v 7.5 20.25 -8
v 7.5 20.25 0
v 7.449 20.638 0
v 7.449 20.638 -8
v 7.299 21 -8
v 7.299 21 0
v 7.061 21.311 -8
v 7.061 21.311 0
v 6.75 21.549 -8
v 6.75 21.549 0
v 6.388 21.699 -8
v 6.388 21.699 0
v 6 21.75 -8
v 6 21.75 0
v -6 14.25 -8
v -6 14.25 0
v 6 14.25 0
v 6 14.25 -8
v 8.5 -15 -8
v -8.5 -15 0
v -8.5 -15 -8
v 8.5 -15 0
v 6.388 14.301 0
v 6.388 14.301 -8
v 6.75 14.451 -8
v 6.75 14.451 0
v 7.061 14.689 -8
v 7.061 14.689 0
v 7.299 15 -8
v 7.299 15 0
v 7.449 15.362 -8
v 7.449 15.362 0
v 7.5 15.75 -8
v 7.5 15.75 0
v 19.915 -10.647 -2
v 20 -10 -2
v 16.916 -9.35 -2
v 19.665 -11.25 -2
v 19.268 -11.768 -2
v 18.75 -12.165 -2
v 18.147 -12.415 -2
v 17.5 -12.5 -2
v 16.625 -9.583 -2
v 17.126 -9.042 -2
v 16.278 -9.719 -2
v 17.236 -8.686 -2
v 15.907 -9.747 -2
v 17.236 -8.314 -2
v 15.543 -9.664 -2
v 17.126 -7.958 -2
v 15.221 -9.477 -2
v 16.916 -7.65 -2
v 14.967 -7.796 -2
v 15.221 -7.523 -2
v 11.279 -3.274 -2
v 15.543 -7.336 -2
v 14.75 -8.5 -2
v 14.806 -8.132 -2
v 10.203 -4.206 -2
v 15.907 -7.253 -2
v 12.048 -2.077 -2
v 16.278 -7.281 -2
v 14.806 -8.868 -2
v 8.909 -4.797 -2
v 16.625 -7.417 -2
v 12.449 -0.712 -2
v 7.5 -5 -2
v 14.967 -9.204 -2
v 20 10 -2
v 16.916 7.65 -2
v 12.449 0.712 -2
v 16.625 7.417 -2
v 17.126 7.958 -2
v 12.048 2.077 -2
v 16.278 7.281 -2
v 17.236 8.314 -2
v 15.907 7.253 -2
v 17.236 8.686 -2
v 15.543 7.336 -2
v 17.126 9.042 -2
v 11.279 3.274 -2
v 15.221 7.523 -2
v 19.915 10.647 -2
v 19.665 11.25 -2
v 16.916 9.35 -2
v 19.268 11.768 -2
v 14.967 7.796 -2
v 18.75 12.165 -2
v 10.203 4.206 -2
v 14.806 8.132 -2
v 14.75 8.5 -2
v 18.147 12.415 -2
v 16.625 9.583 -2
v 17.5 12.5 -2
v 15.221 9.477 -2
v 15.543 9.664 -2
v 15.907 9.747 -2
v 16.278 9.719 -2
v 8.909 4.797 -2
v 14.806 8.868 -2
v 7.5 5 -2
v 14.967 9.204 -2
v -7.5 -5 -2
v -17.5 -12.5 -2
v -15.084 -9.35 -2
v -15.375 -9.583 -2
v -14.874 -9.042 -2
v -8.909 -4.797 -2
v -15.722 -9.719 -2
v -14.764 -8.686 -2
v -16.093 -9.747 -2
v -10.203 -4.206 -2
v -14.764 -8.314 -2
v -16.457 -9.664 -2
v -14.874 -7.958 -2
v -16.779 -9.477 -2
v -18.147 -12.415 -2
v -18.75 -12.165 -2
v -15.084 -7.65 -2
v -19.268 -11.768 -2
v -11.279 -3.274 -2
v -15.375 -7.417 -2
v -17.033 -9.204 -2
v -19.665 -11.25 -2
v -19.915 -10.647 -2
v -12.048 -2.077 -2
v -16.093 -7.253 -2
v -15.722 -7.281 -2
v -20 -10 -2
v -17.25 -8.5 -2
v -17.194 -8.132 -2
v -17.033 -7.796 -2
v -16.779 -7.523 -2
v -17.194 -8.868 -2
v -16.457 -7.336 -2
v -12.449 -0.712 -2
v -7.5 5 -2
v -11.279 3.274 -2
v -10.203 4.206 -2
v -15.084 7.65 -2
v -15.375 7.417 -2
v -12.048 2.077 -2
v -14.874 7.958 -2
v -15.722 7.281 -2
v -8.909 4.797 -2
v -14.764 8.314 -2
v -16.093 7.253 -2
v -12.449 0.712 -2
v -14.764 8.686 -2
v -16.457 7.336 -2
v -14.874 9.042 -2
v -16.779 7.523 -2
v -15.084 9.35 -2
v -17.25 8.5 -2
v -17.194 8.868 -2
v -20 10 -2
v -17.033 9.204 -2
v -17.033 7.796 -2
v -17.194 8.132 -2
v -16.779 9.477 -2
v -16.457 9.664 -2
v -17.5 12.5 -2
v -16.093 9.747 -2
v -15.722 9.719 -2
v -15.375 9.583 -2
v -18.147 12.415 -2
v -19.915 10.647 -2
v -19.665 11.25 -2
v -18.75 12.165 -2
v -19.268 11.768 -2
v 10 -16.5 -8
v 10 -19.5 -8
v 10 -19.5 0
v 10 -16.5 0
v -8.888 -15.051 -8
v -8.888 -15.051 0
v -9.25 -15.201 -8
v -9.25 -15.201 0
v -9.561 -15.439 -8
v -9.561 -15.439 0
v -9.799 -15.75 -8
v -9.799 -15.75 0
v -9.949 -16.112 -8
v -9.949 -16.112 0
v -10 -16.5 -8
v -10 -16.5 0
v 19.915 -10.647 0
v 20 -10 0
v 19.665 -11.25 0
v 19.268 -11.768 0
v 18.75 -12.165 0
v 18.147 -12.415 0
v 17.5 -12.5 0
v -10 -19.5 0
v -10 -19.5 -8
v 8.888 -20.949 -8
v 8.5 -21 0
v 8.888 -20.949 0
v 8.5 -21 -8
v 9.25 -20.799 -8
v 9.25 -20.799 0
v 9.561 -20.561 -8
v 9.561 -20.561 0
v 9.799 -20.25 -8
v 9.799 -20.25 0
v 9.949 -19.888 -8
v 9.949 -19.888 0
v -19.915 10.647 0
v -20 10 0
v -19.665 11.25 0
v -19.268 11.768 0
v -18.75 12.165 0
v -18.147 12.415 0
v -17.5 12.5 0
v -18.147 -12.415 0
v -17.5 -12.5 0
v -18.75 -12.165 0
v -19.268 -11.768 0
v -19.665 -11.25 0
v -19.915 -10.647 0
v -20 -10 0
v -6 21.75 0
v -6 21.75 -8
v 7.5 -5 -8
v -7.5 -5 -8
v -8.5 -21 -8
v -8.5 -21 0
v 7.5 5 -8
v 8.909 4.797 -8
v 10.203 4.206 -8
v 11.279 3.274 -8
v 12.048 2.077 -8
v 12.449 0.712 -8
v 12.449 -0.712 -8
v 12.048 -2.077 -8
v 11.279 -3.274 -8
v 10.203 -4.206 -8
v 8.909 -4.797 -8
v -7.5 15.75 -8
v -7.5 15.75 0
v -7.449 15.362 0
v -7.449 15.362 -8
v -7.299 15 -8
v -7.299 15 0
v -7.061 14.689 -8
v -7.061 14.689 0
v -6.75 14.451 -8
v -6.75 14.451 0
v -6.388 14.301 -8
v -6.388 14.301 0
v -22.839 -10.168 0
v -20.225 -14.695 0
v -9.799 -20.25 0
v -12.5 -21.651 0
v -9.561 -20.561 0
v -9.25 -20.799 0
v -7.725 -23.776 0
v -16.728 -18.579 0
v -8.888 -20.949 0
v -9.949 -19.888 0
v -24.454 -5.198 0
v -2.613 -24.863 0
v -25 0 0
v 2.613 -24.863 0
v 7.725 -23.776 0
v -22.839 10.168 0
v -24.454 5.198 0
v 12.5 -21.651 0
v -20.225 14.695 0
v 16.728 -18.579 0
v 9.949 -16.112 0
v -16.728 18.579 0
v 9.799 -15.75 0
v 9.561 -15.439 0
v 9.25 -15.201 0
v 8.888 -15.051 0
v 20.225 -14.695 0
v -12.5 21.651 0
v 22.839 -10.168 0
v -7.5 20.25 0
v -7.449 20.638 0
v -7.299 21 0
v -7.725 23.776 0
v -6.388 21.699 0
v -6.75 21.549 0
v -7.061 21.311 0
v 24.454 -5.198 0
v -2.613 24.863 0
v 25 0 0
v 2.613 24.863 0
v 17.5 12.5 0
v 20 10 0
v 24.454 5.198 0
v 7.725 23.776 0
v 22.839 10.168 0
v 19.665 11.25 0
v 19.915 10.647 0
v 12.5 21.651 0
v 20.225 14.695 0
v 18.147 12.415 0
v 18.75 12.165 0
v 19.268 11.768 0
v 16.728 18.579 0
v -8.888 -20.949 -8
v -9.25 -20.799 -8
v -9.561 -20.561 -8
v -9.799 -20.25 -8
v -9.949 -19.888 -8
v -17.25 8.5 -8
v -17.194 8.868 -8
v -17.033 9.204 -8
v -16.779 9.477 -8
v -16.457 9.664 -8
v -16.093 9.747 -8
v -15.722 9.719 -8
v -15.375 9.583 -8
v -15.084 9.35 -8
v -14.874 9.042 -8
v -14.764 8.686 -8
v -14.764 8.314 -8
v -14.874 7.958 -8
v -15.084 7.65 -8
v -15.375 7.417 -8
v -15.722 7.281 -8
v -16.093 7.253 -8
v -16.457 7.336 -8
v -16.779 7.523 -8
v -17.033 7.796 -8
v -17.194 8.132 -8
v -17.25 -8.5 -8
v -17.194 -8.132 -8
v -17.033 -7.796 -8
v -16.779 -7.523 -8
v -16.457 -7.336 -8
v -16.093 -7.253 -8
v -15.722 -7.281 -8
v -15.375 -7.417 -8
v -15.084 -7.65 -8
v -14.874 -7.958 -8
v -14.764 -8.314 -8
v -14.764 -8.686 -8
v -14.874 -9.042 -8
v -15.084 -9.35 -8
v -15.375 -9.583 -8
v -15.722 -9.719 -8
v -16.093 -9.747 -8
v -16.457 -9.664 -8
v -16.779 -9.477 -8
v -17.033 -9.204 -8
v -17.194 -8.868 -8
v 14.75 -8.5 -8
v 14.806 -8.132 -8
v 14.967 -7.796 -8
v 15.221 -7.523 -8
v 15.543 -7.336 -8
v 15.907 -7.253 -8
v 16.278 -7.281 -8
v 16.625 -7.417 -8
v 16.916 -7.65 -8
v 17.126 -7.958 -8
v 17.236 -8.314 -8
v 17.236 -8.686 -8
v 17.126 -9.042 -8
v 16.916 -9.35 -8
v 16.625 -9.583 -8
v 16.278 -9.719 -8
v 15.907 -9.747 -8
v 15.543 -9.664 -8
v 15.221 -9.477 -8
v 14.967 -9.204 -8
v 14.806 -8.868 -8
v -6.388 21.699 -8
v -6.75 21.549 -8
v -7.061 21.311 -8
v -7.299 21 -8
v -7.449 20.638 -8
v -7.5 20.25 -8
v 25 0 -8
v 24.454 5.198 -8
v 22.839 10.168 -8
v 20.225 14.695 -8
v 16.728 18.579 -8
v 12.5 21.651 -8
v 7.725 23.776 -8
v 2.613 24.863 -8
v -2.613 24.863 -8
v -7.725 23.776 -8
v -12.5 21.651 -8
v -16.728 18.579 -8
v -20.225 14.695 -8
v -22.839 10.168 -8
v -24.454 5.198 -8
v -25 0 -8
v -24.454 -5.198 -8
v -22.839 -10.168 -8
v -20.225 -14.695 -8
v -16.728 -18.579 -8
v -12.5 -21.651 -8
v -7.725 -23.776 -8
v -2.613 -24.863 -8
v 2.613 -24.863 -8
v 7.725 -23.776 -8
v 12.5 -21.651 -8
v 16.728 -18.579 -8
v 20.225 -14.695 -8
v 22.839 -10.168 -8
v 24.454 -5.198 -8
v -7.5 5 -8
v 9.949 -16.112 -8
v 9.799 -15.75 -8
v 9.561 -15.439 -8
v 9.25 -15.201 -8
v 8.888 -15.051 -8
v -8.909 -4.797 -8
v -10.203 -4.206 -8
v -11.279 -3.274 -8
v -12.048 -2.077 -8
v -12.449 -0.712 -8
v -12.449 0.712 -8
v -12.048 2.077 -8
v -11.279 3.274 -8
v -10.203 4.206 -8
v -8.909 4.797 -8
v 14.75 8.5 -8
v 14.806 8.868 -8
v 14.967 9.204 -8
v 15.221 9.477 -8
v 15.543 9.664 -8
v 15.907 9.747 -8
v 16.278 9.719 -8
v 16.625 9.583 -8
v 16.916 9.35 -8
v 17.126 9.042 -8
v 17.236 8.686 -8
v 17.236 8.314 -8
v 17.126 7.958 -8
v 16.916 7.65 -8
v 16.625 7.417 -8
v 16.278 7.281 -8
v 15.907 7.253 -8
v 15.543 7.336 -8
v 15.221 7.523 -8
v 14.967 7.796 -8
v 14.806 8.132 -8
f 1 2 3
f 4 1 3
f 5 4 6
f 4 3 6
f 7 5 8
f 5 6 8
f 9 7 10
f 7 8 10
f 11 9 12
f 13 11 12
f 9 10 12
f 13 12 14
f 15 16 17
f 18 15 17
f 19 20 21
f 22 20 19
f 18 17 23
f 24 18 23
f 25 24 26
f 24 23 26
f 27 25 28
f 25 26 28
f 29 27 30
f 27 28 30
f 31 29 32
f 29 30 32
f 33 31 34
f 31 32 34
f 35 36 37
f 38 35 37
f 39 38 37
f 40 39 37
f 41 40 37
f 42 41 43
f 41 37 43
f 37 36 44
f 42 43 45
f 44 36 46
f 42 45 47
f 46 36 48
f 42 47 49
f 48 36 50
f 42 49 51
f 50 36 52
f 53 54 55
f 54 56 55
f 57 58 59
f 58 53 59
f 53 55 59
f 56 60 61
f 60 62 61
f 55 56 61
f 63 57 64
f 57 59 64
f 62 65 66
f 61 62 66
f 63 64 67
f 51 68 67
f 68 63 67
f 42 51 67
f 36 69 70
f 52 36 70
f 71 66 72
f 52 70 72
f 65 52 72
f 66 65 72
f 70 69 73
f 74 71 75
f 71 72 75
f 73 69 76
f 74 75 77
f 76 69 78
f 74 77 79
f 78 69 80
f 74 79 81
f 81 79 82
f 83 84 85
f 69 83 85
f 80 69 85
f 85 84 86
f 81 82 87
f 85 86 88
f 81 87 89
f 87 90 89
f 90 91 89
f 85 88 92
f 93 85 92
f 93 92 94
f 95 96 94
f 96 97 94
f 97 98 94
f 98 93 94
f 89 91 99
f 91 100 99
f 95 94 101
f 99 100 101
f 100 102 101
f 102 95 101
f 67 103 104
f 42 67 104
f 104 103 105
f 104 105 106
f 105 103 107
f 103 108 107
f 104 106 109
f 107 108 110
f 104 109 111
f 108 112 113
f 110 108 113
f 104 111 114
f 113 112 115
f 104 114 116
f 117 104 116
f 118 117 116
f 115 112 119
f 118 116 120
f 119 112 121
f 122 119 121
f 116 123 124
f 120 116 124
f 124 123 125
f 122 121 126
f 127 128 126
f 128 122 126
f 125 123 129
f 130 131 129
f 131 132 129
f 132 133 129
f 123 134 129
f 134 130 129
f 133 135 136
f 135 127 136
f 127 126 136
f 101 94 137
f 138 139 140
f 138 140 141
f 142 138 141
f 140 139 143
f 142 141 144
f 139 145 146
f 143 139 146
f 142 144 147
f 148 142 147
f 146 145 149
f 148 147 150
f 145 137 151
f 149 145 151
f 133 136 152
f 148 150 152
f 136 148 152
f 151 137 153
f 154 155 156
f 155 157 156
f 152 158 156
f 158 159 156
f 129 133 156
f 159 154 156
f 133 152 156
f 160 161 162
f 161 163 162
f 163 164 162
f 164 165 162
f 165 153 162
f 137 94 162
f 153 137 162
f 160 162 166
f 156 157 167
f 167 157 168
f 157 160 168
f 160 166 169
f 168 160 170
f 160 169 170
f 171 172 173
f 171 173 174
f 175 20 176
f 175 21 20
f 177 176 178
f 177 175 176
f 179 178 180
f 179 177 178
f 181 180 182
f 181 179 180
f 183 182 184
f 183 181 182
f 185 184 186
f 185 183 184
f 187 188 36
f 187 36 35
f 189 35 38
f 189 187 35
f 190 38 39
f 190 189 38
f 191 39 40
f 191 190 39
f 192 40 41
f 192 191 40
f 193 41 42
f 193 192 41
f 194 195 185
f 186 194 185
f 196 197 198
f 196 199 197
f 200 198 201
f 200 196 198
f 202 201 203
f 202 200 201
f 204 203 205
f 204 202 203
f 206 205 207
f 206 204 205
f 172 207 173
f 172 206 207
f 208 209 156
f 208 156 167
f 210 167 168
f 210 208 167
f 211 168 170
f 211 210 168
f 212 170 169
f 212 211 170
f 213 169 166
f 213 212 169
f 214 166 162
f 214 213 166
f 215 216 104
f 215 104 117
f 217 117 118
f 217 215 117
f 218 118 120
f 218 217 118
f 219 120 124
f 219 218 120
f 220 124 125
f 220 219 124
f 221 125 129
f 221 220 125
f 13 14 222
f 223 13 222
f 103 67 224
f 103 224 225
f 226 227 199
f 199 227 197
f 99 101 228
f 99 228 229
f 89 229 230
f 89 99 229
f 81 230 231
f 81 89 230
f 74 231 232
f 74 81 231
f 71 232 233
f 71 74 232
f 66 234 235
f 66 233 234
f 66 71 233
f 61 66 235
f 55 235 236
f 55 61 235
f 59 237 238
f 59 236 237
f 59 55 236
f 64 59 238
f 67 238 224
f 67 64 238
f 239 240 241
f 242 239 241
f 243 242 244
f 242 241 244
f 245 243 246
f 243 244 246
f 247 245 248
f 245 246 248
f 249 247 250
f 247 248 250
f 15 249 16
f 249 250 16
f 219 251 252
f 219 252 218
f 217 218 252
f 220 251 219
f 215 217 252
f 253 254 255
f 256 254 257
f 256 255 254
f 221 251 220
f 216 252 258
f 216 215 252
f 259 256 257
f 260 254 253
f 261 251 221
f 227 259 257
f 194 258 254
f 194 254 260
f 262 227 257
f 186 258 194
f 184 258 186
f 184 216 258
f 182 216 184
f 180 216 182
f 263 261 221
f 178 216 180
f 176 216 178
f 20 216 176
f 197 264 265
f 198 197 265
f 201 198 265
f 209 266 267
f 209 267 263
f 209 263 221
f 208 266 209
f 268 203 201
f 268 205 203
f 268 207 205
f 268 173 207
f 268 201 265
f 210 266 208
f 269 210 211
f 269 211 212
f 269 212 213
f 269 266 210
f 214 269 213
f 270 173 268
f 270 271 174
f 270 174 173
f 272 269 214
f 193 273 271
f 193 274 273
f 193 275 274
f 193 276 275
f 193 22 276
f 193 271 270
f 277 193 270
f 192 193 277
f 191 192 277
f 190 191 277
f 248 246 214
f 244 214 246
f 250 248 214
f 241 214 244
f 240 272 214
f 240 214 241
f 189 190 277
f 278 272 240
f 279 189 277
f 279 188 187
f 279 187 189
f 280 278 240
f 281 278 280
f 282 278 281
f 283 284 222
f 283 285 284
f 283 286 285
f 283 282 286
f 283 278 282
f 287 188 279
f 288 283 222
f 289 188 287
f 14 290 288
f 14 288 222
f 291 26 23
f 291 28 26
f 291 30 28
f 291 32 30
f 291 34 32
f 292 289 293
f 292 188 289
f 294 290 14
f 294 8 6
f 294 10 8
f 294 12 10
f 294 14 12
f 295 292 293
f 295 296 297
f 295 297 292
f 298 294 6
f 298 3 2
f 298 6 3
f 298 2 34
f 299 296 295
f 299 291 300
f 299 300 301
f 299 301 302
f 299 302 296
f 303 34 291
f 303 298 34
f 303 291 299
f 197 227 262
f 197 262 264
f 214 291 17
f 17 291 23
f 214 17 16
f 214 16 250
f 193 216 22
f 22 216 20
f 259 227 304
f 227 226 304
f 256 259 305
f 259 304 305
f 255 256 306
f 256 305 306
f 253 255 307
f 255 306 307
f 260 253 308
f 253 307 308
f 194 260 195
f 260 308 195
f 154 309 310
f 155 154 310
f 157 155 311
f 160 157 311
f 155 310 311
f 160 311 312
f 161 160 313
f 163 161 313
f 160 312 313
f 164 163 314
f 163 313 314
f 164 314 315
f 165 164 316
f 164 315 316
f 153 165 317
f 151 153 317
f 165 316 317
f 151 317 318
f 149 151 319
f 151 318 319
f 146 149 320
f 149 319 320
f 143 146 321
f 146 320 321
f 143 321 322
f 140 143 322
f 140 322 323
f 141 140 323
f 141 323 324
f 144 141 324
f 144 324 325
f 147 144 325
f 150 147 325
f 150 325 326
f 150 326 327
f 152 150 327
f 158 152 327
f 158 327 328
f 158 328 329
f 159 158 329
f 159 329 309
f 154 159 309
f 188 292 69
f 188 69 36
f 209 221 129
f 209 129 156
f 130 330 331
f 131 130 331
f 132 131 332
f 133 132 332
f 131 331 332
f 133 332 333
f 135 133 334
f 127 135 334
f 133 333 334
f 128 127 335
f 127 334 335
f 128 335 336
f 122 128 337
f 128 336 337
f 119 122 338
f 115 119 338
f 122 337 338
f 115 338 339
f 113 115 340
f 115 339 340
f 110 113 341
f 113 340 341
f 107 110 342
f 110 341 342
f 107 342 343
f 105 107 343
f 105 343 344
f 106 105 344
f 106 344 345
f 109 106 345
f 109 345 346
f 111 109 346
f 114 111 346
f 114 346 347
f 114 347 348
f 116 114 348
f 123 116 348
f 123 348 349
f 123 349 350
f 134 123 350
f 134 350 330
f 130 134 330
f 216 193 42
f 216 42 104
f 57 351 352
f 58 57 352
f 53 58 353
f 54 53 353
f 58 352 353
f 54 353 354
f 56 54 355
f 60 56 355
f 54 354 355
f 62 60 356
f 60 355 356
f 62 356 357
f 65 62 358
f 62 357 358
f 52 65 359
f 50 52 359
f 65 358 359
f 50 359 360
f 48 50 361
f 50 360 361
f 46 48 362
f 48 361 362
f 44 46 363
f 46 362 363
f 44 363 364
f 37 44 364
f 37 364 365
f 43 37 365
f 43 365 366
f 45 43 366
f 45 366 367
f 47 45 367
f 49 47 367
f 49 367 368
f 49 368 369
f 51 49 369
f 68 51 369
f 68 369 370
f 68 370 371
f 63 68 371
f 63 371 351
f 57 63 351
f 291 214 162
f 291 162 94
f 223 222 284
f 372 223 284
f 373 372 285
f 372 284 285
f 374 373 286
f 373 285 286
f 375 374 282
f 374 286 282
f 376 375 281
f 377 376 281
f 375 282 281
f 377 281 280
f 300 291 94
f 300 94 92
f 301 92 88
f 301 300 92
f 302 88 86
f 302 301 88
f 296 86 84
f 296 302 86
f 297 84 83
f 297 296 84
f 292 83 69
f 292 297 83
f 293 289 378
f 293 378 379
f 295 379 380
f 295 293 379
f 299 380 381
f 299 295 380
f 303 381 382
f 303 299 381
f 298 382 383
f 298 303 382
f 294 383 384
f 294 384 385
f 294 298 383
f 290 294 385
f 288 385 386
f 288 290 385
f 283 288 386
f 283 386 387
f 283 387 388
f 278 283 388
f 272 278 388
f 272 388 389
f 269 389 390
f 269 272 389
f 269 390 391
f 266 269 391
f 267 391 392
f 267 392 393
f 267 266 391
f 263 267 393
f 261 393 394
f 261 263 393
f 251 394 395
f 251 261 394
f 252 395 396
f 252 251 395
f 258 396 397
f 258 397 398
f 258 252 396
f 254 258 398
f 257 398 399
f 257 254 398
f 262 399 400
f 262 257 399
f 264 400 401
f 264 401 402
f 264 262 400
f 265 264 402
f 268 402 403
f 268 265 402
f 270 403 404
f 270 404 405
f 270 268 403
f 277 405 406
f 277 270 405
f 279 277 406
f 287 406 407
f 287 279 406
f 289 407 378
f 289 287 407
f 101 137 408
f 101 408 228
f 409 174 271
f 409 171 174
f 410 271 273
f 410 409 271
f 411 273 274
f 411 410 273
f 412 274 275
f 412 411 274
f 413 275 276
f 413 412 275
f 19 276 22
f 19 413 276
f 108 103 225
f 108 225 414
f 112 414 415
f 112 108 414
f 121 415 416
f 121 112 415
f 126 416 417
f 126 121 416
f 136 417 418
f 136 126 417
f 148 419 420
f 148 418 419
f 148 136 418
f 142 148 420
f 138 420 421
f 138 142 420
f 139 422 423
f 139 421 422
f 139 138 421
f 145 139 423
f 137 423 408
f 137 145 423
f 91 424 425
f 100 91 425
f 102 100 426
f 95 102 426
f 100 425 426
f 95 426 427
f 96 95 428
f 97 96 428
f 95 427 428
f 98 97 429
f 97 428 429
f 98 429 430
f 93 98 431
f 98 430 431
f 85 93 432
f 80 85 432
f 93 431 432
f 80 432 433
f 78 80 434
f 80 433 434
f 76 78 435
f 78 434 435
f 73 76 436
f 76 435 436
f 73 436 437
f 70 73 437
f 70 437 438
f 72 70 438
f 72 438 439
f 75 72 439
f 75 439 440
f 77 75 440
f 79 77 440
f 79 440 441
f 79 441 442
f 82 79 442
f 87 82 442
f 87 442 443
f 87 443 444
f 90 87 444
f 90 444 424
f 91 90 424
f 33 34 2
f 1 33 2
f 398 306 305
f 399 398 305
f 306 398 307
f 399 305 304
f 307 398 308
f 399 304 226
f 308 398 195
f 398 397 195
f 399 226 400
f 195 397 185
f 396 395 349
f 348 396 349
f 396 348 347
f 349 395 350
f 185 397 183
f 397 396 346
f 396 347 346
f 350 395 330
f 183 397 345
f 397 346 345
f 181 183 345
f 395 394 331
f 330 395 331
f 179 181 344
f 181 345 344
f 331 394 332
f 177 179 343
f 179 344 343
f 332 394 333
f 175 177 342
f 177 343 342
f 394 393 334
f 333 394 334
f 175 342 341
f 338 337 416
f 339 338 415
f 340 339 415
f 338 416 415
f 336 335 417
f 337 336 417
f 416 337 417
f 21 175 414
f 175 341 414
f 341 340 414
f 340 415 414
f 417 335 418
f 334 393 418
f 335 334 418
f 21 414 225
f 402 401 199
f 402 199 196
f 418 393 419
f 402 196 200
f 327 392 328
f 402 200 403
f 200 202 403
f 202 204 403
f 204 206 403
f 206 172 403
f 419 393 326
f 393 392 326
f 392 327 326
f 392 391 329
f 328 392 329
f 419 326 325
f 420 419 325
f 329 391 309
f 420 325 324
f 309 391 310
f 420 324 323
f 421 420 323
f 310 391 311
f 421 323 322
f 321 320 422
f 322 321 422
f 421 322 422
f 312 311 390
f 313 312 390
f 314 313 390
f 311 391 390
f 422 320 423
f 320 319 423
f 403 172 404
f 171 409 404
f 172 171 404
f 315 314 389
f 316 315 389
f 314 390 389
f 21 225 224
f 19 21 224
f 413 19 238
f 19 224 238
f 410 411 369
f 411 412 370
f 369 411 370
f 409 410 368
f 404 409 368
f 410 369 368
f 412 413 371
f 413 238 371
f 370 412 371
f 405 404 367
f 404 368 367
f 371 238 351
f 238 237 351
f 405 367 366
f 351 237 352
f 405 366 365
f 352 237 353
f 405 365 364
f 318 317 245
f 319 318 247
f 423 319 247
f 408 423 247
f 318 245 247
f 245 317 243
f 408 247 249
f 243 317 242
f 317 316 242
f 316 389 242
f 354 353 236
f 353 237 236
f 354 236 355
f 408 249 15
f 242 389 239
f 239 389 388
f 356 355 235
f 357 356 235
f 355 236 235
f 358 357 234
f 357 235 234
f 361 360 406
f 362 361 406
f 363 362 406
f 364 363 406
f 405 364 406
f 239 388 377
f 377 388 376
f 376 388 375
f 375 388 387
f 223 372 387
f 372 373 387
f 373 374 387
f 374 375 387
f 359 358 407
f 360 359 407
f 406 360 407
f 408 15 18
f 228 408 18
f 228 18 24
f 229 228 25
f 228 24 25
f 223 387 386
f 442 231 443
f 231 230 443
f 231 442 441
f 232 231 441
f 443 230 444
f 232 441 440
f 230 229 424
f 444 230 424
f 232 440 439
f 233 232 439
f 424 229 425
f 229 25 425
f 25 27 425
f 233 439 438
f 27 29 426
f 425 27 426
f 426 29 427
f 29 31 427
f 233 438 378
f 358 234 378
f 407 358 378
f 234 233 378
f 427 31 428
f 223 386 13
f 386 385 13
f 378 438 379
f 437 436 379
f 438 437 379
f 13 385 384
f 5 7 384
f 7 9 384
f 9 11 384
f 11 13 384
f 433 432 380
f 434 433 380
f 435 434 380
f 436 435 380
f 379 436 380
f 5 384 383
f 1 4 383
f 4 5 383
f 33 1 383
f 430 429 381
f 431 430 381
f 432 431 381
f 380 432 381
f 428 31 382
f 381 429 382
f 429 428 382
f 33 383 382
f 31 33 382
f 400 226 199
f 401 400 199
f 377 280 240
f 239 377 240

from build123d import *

# Parameters (mm, degrees)
SKETCH1_R             = 25
BOSS_EXTRUDE1_DEPTH   = 8
CUT_EXTRUDE1_DEPTH    = 2
CUT_EXTRUDE2_DEPTH    = 36.860842154
M3X0_5_TAPPED_HOLE1_D = 2.5
CUT_EXTRUDE3_DEPTH    = 37.249137921
SKETCH7_W             = 20
SKETCH7_H             = 6
CUT_EXTRUDE4_DEPTH    = 37.249137921
FILLET1_R             = 1.5


with BuildPart() as part:
    # Sketch1 → Boss-Extrude1 (new body)
    with BuildSketch(Plane.XY):
        Circle(SKETCH1_R)
    extrude(amount=-BOSS_EXTRUDE1_DEPTH)

    # Sketch2 → Cut-Extrude1 (cut)
    with BuildSketch(Plane.XY):
        with BuildLine():
            Line((-17.5, 12.5), (17.5, 12.5))
            ThreePointArc((17.5, 12.5), (19.267766953, 11.767766953), (20, 10))
            Line((20, 10), (20, -10))
            ThreePointArc((20, -10), (19.267766953, -11.767766953), (17.5, -12.5))
            Line((17.5, -12.5), (-17.5, -12.5))
            ThreePointArc((-17.5, -12.5), (-19.267766953, -11.767766953), (-20, -10))
            Line((-20, -10), (-20, 10))
            ThreePointArc((-20, 10), (-19.267766953, 11.767766953), (-17.5, 12.5))
        make_face()
    extrude(amount=-CUT_EXTRUDE1_DEPTH, mode=Mode.SUBTRACT)

    # Sketch3 → Cut-Extrude2 (cut, through all)
    with BuildSketch(Plane.XY.offset(-2)):
        with BuildLine():
            Line((-7.5, 5), (7.5, 5))
            ThreePointArc((7.5, 5), (12.5, 0), (7.5, -5))
            Line((7.5, -5), (-7.5, -5))
            ThreePointArc((-7.5, -5), (-12.5, 0), (-7.5, 5))
        make_face()
    extrude(amount=-CUT_EXTRUDE2_DEPTH, mode=Mode.SUBTRACT)

    # M3x0.5 Tapped Hole1 (through all)
    with Locations(Plane.XY.offset(-2)):
        with Locations((16, 8.5), (-16, 8.5), (-16, -8.5), (16, -8.5)):
            Hole(M3X0_5_TAPPED_HOLE1_D / 2)

    # Sketch6 → Cut-Extrude3 (cut, through all)
    with BuildSketch(Plane.XY):
        with BuildLine():
            Line((6, 21.75), (-6, 21.75))
            ThreePointArc((-6, 21.75), (-7.060660172, 21.310660172), (-7.5, 20.25))
            Line((-7.5, 20.25), (-7.5, 15.75))
            ThreePointArc((-7.5, 15.75), (-7.060660172, 14.689339828), (-6, 14.25))
            Line((-6, 14.25), (6, 14.25))
            ThreePointArc((6, 14.25), (7.060660172, 14.689339828), (7.5, 15.75))
            Line((7.5, 15.75), (7.5, 20.25))
            ThreePointArc((7.5, 20.25), (7.060660172, 21.310660172), (6, 21.75))
        make_face()
    extrude(amount=-CUT_EXTRUDE3_DEPTH, mode=Mode.SUBTRACT)

    # Sketch7 → Cut-Extrude4 (cut, through all)
    with BuildSketch(Plane.XY):
        with Locations((0, -18)):
            Rectangle(SKETCH7_W, SKETCH7_H)
    extrude(amount=-CUT_EXTRUDE4_DEPTH, mode=Mode.SUBTRACT)

    # Fillet1
    fillet1_edges = [part.edges().sort_by_distance(p)[0] for p in [
        (10, -15, -4),
        (10, -21, -4),
        (-10, -21, -4),
        (-10, -15, -4),
    ]]
    fillet(fillet1_edges, radius=FILLET1_R)


solid = part.part
